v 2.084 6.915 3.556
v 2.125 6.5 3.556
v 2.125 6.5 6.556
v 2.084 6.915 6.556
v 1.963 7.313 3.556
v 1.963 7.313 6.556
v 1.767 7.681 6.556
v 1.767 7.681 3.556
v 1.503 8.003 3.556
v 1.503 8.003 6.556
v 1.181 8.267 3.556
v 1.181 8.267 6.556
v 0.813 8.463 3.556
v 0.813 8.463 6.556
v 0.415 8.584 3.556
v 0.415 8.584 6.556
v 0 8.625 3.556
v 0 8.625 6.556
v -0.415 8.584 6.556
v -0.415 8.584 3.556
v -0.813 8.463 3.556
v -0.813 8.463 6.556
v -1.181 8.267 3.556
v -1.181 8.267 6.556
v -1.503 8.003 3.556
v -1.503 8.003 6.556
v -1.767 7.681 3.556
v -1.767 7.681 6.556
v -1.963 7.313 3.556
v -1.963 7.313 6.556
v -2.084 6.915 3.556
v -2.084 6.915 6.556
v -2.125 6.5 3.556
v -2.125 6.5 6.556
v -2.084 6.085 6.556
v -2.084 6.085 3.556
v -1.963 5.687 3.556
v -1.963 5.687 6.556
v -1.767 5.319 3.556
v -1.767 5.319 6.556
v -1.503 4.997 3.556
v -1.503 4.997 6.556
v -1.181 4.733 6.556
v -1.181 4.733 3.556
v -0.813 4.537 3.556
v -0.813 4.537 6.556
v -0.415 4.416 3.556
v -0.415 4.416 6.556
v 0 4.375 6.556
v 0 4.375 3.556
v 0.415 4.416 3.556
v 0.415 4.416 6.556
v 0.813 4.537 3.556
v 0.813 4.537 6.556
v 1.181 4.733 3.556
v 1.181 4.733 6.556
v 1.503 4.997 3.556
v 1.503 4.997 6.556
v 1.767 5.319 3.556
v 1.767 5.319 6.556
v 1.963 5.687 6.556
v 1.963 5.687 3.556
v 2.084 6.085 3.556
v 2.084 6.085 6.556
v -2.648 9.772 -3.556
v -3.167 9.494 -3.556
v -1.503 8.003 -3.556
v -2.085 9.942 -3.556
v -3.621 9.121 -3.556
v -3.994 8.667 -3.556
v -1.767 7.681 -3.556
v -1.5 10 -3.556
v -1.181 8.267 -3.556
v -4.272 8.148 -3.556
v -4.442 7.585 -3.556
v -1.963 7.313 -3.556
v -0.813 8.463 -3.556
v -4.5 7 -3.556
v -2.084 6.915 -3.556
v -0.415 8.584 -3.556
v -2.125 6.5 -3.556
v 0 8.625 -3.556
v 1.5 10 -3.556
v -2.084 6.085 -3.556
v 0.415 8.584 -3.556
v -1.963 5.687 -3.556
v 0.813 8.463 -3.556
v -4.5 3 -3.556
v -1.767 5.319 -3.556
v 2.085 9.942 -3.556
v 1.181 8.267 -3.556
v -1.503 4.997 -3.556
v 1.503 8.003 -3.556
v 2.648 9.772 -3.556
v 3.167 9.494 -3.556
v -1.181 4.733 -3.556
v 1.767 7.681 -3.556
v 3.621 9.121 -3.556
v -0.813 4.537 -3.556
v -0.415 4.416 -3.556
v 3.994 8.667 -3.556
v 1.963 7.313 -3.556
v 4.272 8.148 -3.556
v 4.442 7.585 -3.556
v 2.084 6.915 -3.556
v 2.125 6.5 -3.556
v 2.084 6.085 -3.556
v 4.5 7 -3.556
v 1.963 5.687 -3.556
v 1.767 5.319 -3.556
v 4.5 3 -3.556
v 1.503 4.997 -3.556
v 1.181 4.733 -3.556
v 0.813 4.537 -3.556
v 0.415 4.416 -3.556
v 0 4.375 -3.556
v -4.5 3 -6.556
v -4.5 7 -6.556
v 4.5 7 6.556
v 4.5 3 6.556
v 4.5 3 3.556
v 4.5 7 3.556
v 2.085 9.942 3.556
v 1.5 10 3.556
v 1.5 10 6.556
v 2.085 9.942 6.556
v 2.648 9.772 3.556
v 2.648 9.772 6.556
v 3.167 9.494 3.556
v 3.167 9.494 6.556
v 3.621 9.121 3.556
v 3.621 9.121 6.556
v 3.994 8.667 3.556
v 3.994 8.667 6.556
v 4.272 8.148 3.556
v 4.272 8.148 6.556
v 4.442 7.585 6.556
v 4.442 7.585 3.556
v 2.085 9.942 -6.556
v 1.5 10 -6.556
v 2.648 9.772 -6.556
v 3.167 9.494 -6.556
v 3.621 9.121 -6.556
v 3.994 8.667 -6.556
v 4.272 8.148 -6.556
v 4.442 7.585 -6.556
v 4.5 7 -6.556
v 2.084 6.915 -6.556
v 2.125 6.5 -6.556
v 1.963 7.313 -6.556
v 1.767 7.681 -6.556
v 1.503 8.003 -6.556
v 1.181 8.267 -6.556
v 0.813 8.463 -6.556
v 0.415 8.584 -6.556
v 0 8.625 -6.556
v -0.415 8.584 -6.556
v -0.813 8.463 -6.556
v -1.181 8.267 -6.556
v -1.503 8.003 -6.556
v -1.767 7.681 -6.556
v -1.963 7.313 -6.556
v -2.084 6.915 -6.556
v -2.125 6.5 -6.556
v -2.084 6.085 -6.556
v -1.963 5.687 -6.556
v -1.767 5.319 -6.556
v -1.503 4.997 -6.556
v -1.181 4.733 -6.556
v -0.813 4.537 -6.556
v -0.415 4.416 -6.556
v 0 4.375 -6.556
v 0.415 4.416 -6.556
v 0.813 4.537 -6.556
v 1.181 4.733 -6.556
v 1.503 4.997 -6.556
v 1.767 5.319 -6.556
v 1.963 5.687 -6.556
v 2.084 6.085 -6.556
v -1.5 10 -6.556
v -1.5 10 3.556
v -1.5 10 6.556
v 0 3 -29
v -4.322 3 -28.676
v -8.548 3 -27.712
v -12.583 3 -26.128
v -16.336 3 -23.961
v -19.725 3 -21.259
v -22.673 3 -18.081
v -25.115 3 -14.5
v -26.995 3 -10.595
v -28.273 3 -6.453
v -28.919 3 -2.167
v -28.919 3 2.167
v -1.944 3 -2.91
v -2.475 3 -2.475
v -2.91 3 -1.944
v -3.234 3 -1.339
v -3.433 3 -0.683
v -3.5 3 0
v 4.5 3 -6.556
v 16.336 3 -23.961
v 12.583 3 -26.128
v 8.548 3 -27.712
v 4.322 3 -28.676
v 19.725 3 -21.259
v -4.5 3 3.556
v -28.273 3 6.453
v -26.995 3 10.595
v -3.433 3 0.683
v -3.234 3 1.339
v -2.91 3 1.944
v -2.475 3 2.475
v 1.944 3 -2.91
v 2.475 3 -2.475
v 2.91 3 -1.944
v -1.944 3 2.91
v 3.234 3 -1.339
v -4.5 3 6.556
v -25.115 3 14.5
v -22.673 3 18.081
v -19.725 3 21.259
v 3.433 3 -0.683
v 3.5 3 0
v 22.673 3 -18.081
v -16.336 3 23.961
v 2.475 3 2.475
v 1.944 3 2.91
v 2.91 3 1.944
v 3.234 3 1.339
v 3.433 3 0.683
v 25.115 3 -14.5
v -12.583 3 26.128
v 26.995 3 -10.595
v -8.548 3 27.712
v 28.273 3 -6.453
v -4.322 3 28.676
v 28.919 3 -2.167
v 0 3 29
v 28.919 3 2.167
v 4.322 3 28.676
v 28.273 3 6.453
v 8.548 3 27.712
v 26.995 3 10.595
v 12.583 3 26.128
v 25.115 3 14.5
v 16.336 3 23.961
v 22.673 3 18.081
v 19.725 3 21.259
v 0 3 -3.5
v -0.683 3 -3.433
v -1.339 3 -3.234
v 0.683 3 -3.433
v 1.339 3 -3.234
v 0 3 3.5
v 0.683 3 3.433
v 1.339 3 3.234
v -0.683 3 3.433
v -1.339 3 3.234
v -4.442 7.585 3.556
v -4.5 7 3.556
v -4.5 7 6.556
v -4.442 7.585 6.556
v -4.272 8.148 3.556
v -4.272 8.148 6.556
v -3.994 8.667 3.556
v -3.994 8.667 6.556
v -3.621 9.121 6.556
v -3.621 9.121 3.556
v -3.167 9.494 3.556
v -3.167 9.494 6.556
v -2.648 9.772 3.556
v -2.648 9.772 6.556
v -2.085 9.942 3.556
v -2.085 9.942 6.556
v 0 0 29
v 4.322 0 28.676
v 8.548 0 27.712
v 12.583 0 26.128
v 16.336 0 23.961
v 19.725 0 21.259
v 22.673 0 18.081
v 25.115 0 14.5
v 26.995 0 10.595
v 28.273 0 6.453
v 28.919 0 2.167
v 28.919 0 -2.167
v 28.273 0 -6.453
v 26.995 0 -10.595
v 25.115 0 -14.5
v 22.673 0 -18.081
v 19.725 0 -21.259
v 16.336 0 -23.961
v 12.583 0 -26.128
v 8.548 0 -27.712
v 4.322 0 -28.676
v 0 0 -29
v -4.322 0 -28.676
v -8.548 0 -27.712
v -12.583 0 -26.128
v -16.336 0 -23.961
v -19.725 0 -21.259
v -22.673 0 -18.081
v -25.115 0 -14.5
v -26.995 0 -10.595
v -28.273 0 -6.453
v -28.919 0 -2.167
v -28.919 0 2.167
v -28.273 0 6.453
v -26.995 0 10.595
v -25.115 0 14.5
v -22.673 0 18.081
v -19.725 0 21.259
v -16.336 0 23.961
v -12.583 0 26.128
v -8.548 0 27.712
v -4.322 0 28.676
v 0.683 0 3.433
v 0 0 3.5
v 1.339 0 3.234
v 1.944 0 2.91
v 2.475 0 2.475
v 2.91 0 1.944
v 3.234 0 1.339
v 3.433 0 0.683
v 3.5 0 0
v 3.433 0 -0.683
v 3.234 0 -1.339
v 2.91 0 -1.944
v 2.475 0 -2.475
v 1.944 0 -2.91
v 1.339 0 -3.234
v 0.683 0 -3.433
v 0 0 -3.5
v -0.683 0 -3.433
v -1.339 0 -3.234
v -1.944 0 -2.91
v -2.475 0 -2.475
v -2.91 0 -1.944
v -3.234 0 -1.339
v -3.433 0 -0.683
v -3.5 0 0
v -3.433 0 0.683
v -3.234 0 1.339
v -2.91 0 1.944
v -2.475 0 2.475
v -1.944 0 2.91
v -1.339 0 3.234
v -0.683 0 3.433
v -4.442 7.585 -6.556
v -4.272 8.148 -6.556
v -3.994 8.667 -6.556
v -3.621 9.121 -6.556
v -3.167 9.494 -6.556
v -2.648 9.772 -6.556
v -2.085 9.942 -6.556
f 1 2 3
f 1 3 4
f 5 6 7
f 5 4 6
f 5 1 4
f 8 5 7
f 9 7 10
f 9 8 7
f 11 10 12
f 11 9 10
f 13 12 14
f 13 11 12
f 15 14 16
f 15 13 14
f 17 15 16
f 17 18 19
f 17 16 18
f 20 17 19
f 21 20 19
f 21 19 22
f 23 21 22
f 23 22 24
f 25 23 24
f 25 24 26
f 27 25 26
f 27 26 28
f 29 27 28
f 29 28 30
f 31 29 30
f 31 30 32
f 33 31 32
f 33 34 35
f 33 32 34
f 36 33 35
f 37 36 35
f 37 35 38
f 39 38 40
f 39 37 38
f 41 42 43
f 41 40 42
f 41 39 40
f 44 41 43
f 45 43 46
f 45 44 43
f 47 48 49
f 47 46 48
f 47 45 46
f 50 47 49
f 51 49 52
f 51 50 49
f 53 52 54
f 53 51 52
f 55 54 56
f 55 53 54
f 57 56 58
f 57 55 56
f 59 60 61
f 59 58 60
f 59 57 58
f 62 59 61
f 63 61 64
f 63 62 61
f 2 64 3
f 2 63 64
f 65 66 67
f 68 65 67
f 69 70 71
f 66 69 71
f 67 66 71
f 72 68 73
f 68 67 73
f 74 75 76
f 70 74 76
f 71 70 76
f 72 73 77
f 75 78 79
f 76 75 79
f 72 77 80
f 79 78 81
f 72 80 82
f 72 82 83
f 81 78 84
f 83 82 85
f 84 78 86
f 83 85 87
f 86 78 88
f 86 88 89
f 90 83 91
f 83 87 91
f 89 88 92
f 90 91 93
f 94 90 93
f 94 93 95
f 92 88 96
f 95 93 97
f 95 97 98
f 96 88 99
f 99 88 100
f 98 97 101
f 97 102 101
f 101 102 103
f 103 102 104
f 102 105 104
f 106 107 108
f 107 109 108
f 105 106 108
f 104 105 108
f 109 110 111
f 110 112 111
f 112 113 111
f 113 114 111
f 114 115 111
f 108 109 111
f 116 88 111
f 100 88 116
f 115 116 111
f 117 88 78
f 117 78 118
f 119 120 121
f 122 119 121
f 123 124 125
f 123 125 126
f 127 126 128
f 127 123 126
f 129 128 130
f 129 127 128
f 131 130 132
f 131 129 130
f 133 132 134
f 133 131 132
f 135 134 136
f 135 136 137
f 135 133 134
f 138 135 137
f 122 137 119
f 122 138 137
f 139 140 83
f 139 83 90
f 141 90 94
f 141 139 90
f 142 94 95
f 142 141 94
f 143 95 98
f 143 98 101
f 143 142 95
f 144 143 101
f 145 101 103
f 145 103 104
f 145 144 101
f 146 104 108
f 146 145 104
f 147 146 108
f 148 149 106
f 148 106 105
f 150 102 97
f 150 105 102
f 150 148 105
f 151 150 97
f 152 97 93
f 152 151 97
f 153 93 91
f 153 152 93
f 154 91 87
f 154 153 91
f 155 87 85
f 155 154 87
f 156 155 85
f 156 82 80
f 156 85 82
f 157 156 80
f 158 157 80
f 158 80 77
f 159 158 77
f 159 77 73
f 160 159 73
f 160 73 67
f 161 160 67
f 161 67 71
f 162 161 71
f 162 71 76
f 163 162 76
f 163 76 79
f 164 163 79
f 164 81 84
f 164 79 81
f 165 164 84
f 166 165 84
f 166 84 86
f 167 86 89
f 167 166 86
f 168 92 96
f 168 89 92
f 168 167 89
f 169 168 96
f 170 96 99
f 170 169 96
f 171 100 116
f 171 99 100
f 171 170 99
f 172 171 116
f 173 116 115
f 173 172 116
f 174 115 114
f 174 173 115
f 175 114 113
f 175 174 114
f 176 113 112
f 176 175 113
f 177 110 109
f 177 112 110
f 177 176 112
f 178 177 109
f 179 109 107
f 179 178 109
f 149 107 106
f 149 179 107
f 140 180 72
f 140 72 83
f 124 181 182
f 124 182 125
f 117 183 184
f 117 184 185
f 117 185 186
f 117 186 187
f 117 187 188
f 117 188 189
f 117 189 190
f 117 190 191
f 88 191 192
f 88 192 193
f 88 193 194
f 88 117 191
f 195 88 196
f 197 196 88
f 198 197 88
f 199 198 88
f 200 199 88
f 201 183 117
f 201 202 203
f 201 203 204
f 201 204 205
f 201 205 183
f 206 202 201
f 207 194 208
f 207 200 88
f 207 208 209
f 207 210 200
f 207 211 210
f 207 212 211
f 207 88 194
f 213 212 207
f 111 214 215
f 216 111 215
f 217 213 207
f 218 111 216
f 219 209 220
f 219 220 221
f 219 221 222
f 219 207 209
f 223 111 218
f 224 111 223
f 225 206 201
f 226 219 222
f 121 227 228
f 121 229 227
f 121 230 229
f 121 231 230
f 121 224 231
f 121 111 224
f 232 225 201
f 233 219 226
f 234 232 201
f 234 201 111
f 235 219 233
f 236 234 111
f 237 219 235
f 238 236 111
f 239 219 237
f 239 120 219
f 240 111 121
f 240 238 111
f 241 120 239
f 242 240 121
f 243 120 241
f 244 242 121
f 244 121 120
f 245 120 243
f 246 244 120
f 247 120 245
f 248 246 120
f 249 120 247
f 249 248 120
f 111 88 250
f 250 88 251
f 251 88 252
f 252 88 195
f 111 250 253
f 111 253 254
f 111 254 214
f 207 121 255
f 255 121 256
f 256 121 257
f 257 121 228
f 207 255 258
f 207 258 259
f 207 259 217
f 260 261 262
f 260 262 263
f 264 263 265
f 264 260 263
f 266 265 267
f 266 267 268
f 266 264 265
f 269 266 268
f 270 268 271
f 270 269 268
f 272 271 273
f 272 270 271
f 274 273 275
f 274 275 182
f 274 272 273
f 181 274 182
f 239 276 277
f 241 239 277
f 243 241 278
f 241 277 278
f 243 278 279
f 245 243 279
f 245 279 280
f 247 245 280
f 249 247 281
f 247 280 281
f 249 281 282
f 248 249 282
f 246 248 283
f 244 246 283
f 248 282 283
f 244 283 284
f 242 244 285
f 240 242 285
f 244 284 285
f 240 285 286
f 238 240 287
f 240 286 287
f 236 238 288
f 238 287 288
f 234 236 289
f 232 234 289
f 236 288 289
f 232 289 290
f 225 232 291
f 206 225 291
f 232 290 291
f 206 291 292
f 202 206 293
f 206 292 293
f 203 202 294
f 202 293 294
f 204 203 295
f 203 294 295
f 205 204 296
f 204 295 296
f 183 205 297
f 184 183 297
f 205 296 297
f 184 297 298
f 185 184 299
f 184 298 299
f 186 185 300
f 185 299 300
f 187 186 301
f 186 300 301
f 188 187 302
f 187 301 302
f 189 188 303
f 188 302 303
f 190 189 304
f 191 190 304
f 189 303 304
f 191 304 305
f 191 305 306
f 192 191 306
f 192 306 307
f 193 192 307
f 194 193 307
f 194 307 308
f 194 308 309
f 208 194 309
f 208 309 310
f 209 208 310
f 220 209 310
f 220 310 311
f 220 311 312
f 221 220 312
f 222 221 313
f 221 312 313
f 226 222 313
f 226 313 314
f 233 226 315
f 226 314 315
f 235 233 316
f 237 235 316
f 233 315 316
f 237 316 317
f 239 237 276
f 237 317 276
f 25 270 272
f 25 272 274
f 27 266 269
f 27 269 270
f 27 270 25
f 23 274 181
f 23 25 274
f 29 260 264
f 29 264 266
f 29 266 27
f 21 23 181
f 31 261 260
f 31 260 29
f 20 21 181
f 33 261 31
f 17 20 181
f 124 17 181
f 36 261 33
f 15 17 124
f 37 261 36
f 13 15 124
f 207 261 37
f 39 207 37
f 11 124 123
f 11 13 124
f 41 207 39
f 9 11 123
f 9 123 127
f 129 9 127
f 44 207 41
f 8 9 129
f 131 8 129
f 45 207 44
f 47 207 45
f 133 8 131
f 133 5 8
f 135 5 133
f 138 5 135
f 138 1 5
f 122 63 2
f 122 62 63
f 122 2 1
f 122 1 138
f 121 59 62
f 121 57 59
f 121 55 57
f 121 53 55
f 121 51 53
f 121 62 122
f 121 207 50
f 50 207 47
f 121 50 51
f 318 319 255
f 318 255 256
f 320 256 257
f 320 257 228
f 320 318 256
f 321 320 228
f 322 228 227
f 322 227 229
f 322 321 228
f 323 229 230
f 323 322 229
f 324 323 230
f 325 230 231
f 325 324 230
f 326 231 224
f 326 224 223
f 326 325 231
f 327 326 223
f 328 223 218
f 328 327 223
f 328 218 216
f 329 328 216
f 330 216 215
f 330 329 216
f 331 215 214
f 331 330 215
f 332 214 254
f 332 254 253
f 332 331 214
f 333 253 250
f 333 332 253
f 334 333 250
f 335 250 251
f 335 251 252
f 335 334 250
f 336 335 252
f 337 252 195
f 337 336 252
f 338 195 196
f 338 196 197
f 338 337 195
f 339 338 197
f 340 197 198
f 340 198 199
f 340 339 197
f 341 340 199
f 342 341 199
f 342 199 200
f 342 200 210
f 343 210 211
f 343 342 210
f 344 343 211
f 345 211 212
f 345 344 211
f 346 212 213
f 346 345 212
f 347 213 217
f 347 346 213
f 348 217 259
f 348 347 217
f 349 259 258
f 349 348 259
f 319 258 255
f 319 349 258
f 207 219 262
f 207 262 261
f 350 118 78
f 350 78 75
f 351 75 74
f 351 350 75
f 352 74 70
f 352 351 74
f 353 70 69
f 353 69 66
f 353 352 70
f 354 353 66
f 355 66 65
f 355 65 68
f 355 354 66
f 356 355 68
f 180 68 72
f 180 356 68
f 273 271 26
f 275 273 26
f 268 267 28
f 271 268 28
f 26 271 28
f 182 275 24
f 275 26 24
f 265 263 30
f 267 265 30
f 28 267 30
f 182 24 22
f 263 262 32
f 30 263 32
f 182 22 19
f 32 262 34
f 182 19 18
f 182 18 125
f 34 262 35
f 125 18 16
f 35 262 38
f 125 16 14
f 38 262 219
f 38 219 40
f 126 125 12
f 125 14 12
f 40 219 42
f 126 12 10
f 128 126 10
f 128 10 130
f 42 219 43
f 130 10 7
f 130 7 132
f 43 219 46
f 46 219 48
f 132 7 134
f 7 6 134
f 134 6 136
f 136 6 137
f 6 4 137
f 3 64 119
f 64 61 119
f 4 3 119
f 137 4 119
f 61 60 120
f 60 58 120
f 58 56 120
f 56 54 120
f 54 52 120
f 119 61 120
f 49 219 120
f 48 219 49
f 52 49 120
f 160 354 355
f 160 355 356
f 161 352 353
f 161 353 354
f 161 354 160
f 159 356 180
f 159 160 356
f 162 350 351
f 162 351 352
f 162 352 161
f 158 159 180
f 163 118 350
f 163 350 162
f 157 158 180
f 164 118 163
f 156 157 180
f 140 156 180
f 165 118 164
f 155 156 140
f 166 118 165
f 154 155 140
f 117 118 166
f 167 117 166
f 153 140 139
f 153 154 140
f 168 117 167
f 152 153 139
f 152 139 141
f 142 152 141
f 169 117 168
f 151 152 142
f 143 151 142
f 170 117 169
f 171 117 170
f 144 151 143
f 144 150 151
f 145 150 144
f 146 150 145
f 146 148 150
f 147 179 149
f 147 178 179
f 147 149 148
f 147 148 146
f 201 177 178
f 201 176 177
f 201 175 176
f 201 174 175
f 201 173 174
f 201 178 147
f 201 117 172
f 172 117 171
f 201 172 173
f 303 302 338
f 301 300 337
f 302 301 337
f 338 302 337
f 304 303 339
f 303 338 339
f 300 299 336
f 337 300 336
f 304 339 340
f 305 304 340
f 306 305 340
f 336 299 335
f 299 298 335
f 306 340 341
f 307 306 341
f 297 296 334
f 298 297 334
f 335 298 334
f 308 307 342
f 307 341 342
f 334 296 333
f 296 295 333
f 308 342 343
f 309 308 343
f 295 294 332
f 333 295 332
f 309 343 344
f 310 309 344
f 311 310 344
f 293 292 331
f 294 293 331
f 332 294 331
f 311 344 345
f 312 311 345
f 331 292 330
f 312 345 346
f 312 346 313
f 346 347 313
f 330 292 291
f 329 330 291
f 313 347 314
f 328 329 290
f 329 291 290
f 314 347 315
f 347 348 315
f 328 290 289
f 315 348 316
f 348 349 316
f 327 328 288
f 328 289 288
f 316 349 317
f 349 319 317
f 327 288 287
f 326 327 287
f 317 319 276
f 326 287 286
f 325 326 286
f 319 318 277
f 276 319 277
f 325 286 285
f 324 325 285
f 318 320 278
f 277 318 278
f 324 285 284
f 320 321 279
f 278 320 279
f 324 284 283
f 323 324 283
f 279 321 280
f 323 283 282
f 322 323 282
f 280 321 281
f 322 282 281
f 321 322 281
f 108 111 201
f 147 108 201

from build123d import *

# Parameters (mm, degrees)
SKETCH1_R               = 29
SKETCH1_R_2             = 3.5
BOSS_EXTRUDE1_DEPTH     = 3
SKETCH2_W               = 9
SKETCH2_H               = 3
BOSS_EXTRUDE2_DEPTH     = 7
CUT_EXTRUDE1_DEPTH      = 43.213741838
CUT_EXTRUDE1_DEPTH_BACK = 43.213741838
SKETCH4_R               = 2.125
CUT_EXTRUDE4_START      = -6.555610355
CUT_EXTRUDE4_DEPTH      = 13.11122071


# Read off the part's stored shape, not the designer's step: Cut-Extrude4
with BuildPart() as part:
    # Sketch1 → Boss-Extrude1 (new body)
    with BuildSketch(Plane(origin=(0, 0, 0), x_dir=(1, 0, 0), z_dir=(0, 1, 0))):
        with Locations(Location((0, 0, 0), (0, 0, 270))):
            Circle(SKETCH1_R)
        with Locations(Location((0, 0, 0), (0, 0, 270))):
            Circle(SKETCH1_R_2, mode=Mode.SUBTRACT)
    extrude(amount=BOSS_EXTRUDE1_DEPTH)

    # Sketch2 → Boss-Extrude2 (add)
    with BuildSketch(Plane(origin=(0, 3, 0), x_dir=(1, 0, 0), z_dir=(0, 1, 0))):
        with Locations((0, 5.055610355)):
            Rectangle(SKETCH2_W, SKETCH2_H)
        with Locations((0, -5.055610355)):
            Rectangle(SKETCH2_W, SKETCH2_H)
    extrude(amount=BOSS_EXTRUDE2_DEPTH)

    # Sketch4 → Cut-Extrude1 (cut, two sides: drawn at the far end of the back side and taken through both)
    with BuildSketch(Plane.XY.offset(-CUT_EXTRUDE1_DEPTH_BACK)):
        with Locations((0, 6.5)):
            Circle(SKETCH4_R)
    extrude(amount=CUT_EXTRUDE1_DEPTH + CUT_EXTRUDE1_DEPTH_BACK, mode=Mode.SUBTRACT)

    # Cut-Extrude4 outline → Cut-Extrude4 (cut)
    with BuildSketch(Plane.XY.offset(CUT_EXTRUDE4_START)):
        with BuildLine():
            Line((4.5, 10), (1.5, 10))
            ThreePointArc((1.5, 10), (3.621320344, 9.121320344), (4.5, 7))
            Line((4.5, 7), (4.5, 10))
        make_face()
        with BuildLine():
            ThreePointArc((-4.5, 7), (-3.621320344, 9.121320344), (-1.5, 10))
            Line((-1.5, 10), (-4.5, 10))
            Line((-4.5, 10), (-4.5, 7))
        make_face()
    extrude(amount=CUT_EXTRUDE4_DEPTH, mode=Mode.SUBTRACT)


solid = part.part
